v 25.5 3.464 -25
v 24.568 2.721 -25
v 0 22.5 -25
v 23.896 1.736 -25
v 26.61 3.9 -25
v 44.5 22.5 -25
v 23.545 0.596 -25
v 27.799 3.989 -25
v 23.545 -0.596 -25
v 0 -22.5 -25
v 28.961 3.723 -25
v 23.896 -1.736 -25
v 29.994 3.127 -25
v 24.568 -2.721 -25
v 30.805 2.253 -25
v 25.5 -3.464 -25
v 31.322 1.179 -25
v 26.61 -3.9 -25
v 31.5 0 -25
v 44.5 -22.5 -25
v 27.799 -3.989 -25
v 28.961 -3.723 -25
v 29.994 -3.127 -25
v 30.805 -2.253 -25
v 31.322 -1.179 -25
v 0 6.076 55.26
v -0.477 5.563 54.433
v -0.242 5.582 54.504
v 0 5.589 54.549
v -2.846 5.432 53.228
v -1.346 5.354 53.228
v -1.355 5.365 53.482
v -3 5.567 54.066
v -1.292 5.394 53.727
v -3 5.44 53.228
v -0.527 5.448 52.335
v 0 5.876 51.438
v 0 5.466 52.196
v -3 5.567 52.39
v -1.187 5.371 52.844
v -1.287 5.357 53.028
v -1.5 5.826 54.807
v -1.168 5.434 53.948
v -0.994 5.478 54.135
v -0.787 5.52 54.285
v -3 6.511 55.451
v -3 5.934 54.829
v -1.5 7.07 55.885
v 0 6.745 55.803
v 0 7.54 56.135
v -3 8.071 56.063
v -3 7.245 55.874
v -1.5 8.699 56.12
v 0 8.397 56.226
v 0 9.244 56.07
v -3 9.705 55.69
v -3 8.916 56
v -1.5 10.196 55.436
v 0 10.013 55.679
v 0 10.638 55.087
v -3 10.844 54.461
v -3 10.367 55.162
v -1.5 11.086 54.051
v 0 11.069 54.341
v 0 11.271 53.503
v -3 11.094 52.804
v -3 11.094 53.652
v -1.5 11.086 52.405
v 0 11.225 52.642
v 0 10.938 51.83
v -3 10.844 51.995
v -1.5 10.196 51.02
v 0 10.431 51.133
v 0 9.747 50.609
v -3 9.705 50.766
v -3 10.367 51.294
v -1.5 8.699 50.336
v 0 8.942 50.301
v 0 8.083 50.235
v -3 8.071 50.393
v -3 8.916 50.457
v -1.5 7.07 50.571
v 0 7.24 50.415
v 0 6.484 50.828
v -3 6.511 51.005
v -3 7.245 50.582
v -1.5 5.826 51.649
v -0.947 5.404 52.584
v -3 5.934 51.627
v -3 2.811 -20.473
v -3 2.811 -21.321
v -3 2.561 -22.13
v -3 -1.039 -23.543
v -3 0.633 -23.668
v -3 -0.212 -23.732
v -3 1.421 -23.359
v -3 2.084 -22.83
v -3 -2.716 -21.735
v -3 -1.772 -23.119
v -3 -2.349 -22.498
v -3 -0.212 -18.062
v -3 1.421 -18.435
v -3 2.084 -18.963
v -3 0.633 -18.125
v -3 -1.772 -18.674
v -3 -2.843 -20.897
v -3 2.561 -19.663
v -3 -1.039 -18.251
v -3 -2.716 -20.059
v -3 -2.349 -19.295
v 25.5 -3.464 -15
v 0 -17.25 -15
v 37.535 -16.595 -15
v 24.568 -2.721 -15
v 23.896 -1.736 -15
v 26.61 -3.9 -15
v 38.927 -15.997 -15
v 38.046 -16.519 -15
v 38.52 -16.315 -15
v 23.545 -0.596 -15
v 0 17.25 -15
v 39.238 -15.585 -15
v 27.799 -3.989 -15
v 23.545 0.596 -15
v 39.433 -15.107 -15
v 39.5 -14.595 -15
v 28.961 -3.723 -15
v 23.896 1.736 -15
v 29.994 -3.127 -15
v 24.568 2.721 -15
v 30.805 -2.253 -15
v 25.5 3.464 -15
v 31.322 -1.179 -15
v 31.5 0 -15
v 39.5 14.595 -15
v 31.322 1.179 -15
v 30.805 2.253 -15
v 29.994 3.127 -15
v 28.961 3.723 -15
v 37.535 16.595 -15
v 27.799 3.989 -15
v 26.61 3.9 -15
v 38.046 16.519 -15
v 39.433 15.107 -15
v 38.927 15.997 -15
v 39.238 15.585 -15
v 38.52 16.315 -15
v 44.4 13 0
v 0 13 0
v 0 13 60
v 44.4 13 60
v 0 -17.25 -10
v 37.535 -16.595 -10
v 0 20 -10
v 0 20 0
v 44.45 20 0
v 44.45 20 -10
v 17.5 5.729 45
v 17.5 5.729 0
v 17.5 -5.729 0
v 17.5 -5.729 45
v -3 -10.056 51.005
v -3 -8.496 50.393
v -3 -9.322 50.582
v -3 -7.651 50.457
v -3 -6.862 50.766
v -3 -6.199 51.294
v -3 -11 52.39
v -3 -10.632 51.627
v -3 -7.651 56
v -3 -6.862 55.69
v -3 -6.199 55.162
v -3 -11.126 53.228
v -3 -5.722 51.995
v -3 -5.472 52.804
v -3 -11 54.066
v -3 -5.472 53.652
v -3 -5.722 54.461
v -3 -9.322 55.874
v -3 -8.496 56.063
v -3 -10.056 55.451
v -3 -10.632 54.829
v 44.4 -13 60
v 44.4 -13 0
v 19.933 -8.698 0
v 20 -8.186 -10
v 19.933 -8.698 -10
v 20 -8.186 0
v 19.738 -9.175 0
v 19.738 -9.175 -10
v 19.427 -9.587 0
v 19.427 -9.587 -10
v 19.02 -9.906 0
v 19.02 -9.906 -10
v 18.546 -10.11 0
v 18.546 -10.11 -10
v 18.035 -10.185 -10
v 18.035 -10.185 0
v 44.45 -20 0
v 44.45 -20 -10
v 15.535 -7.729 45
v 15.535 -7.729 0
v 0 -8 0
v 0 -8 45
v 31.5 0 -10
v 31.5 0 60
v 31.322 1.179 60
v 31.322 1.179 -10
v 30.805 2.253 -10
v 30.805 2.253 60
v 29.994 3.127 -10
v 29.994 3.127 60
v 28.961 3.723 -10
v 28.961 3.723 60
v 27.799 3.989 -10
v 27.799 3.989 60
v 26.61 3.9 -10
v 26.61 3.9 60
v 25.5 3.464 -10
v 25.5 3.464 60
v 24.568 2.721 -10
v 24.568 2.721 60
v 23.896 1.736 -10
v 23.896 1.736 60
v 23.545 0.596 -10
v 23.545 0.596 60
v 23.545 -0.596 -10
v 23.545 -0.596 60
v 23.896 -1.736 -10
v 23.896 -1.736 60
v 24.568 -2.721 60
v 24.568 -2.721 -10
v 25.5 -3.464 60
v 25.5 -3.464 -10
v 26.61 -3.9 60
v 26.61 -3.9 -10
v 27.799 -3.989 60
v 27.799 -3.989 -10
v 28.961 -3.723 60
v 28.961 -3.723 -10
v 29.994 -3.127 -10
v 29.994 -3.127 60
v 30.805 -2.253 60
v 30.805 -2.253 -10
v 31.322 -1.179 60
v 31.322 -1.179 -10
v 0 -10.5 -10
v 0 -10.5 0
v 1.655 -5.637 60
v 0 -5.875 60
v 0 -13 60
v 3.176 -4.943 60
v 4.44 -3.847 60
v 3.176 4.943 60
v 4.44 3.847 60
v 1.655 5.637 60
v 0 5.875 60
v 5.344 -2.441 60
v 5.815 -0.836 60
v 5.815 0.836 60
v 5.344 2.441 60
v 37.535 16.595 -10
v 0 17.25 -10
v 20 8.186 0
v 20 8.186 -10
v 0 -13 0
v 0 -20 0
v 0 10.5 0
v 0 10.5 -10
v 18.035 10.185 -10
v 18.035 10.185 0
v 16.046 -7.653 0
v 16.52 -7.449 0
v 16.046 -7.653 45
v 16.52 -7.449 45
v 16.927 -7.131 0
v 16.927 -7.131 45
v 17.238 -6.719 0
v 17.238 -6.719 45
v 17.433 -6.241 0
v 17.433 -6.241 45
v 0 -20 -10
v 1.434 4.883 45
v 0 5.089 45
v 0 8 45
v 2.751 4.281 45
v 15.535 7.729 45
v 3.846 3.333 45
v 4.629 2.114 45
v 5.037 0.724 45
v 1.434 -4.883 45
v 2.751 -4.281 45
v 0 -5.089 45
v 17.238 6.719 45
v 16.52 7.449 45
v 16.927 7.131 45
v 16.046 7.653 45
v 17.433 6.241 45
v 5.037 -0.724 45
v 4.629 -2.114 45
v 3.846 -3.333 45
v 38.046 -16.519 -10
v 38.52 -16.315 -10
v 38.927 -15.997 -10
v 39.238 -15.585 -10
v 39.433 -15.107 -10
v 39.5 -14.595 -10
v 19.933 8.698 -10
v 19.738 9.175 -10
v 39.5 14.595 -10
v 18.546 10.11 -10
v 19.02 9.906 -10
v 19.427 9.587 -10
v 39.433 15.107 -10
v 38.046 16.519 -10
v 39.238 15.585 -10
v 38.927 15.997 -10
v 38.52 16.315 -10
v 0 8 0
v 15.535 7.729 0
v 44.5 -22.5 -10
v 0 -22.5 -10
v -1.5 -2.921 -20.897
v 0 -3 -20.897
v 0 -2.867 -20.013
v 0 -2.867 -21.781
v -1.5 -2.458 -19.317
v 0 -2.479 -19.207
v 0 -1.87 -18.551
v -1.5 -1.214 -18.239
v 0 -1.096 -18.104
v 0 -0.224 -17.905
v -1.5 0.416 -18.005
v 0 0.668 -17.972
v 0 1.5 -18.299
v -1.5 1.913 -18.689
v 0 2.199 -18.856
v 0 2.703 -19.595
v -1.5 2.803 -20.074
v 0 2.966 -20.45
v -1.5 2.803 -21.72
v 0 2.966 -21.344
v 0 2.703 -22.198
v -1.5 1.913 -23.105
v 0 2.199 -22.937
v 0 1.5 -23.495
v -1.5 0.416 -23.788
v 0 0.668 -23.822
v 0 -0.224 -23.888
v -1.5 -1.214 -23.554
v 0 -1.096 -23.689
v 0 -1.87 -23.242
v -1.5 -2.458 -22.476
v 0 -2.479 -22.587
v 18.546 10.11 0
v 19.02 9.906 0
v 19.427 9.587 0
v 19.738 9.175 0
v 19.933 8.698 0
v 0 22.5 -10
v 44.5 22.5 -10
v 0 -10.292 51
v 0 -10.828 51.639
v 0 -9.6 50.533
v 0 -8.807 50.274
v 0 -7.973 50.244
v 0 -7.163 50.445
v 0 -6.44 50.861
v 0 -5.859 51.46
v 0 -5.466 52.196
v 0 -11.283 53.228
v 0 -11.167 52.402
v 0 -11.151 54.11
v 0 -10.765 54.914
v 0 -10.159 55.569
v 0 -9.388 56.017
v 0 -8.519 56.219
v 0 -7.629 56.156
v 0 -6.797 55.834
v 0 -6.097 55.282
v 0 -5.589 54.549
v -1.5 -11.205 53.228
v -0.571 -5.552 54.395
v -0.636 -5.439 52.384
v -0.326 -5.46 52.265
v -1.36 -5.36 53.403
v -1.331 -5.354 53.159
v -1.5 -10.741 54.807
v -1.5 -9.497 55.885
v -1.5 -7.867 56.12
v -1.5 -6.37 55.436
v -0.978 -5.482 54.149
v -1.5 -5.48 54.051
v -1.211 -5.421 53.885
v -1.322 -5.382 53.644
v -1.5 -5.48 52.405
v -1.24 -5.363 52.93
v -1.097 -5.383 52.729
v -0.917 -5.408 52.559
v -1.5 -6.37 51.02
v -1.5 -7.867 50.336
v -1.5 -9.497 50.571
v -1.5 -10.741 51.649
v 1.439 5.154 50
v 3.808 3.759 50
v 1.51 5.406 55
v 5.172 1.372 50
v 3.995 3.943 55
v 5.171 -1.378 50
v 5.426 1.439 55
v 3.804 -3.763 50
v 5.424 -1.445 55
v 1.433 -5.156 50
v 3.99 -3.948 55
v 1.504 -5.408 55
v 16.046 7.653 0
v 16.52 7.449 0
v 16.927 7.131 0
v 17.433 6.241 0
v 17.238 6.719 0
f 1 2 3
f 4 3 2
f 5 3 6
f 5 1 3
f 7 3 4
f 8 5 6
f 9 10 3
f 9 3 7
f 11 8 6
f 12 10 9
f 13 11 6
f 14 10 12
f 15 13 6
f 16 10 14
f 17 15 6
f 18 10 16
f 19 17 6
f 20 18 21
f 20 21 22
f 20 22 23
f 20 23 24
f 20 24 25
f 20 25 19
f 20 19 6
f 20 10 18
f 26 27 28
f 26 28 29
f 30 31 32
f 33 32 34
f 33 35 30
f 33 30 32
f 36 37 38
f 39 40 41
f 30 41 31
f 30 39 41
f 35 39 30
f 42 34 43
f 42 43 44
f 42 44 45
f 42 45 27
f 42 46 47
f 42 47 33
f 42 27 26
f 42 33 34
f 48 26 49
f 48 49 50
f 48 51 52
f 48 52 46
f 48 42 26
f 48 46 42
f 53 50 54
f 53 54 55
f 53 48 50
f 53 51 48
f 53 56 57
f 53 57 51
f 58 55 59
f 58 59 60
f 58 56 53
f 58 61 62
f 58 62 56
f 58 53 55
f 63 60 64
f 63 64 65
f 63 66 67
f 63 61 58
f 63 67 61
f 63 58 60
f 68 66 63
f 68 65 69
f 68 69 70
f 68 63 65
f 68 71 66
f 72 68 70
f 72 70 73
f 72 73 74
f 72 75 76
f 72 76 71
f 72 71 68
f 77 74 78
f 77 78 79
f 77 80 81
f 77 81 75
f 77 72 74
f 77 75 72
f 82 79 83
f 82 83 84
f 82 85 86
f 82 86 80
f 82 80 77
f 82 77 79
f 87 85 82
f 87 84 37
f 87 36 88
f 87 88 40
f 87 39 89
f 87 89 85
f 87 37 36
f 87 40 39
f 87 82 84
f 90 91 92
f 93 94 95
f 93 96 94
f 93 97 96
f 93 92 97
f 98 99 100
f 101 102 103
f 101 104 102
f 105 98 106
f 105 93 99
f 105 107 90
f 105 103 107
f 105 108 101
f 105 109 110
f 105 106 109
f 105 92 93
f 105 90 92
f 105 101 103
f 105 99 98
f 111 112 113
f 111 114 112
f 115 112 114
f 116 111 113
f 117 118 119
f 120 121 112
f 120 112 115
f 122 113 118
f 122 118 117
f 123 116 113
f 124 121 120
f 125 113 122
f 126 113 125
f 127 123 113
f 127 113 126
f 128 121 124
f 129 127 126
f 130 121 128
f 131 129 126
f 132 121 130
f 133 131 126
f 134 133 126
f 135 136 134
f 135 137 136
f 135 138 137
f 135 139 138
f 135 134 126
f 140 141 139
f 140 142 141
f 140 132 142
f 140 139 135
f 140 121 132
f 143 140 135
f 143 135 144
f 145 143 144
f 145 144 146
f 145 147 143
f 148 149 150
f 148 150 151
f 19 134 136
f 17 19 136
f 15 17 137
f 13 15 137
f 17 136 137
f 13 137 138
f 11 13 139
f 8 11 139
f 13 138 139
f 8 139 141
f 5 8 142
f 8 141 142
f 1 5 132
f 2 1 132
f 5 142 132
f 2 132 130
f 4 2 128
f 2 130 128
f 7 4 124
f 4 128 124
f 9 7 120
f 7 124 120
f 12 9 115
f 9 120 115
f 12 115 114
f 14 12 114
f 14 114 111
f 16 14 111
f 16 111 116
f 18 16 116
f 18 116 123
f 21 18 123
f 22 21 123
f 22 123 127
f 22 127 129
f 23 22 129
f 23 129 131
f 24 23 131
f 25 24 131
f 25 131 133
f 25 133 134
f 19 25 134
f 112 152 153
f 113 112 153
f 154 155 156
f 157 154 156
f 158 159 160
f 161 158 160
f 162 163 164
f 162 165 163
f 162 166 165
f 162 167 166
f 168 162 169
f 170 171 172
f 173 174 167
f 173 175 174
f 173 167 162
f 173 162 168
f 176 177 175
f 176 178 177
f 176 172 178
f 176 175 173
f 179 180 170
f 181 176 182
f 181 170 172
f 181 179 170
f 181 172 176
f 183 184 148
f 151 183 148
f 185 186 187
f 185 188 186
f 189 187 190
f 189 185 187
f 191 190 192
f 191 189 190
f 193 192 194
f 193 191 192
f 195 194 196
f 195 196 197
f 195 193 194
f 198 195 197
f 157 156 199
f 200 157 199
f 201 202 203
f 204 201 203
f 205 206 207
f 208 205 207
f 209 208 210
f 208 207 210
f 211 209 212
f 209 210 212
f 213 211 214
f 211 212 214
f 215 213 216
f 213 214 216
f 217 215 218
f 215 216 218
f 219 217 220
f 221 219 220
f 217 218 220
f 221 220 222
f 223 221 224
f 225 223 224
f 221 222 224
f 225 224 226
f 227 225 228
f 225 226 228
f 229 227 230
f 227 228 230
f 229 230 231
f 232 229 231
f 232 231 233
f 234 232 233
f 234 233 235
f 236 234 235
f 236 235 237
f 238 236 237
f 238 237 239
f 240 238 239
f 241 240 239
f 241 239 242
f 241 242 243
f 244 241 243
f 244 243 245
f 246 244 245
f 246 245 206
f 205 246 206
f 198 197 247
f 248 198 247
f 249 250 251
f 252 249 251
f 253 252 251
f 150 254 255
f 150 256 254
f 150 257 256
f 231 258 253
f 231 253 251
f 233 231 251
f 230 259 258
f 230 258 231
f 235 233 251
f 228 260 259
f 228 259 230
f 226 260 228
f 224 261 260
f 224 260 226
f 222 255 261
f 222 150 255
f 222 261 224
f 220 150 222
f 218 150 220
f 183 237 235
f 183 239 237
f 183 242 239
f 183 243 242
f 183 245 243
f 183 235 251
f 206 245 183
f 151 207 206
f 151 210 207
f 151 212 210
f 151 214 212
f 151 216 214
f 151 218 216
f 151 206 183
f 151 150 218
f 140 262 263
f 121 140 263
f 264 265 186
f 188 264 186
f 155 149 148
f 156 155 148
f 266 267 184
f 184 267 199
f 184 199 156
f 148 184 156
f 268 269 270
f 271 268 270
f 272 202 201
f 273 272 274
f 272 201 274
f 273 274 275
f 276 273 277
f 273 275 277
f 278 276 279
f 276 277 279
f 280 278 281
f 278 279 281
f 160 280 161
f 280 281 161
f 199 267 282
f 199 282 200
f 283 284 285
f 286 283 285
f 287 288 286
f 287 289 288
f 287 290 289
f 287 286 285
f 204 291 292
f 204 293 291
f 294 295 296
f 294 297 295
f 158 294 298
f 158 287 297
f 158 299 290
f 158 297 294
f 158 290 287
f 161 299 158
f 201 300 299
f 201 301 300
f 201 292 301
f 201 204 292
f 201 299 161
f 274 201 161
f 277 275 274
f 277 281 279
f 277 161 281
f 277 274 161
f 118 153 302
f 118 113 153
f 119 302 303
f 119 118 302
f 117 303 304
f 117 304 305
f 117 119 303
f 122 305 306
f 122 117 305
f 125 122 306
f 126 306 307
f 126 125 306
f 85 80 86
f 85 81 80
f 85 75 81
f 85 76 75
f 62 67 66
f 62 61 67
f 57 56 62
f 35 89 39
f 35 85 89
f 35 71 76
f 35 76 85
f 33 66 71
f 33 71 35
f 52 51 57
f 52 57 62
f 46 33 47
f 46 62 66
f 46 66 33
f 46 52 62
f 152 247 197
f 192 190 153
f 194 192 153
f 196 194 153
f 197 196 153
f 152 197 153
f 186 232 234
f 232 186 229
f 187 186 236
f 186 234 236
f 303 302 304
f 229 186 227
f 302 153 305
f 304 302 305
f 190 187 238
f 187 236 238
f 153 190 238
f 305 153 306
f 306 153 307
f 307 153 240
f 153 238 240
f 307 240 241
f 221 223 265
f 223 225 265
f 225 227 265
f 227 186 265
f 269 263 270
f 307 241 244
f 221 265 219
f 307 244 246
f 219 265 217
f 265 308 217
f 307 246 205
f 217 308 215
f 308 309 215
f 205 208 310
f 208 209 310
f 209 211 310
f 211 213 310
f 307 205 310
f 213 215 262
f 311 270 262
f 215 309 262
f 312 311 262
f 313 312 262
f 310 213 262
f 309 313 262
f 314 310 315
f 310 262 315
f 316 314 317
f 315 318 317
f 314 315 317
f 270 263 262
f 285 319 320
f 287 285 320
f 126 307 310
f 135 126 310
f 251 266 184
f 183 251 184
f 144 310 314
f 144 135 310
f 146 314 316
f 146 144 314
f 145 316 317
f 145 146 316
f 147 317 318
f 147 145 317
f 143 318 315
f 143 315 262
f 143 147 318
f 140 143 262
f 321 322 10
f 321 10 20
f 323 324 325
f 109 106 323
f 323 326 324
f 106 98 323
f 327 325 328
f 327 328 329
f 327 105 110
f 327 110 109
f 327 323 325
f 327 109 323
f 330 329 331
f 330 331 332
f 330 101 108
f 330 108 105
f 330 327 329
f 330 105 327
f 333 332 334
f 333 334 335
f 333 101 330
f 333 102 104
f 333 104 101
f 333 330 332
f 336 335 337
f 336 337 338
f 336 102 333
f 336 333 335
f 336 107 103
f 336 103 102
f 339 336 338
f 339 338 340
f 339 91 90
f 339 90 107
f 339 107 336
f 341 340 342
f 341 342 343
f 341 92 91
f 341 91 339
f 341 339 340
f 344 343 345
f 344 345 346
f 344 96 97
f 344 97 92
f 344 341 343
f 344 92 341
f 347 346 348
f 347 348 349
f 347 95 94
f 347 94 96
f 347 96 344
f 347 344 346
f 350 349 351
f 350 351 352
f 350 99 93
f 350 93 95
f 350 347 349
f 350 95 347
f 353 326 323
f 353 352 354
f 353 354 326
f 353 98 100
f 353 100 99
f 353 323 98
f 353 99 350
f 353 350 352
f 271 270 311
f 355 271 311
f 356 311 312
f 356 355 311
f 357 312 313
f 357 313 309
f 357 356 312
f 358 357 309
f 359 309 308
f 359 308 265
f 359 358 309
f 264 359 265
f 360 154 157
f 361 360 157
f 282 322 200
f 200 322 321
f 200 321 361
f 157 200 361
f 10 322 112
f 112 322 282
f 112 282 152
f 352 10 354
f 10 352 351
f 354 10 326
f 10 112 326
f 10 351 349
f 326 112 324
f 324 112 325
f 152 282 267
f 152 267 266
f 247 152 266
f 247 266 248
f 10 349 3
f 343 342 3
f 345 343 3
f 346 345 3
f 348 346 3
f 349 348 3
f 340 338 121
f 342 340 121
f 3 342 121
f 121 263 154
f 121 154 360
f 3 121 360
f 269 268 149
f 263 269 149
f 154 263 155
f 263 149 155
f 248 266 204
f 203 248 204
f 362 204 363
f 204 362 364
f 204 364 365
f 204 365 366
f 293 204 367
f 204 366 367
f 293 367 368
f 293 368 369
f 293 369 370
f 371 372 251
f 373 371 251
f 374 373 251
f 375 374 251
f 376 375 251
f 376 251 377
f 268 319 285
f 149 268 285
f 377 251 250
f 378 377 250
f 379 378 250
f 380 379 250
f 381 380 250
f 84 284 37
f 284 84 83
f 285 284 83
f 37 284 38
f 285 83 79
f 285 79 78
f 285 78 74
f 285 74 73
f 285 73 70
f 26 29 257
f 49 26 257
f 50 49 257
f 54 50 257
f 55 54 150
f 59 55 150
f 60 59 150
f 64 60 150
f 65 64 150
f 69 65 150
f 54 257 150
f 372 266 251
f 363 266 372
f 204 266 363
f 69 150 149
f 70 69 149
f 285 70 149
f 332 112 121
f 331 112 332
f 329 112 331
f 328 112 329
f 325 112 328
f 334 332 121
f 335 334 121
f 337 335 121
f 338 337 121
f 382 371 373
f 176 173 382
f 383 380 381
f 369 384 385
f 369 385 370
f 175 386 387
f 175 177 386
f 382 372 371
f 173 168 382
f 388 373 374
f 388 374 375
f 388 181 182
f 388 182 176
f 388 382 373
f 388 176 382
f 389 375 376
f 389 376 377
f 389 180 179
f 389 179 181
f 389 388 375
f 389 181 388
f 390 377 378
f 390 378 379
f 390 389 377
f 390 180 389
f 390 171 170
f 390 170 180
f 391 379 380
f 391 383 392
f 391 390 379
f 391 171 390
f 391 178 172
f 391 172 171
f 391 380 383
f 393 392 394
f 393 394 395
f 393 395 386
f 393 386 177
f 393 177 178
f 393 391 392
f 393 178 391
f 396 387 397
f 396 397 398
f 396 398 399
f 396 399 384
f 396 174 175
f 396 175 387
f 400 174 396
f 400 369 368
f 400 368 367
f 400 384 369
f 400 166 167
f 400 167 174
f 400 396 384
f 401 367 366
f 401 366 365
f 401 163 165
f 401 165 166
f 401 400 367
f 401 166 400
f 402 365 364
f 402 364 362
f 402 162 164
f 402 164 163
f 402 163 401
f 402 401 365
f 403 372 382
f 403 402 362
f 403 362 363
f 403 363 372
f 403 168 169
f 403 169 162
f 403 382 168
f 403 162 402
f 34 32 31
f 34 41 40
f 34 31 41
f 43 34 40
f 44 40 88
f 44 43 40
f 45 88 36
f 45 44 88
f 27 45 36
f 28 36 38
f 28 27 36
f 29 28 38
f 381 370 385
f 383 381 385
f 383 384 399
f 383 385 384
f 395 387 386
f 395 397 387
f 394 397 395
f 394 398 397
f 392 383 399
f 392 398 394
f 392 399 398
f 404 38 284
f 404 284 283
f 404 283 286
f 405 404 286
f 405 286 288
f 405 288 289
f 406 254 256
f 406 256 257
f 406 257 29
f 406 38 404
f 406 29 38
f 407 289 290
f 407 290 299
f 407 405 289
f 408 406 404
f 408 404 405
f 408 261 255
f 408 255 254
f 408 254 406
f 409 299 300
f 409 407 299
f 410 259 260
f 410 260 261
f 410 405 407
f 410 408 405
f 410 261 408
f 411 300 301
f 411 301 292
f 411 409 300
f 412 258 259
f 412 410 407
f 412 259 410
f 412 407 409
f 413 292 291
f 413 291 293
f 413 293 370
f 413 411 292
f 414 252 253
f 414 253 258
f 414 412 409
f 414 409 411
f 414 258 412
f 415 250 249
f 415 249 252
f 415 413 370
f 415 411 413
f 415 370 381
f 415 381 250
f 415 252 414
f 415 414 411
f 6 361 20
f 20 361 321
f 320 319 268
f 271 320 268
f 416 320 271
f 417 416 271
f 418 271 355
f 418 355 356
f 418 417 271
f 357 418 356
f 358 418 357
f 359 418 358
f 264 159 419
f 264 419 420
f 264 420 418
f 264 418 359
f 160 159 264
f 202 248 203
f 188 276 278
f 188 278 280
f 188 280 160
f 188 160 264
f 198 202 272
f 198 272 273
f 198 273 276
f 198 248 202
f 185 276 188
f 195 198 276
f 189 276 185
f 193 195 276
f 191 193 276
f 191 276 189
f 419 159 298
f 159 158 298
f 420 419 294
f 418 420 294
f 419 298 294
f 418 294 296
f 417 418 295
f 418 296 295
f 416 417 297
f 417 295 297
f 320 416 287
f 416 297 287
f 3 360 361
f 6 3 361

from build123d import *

# Parameters (mm, degrees)
F0_W      = 88.8
F0_H      = 26
F1_DEPTH  = 60
F3_DEPTH  = 45
F4_R      = 2
F5_W      = 88.9
F5_H      = 40
F6_DEPTH  = 10
F8_DEPTH  = 10
F9_R      = 2
F10_W     = 89
F10_H     = 45
F11_DEPTH = 15
F13_DEPTH = 5
F14_R     = 2
F15_R     = 4.6723110677
F15_R_2   = 4
F16_DEPTH = 85.001
F17_W     = 79.5239582658
F17_H     = 118.802215904
F18_DEPTH = 80
F19_R     = 3
F20_DEPTH = 3
F20_TAPER = 3
F21_DEPTH = 3
F21_TAPER = 3
F22_R     = 5.0890490665
F23_DEPTH = 25
F23_TAPER = -3


with BuildPart() as f1:
    # F0 (on Top) → F1 (new body)
    with BuildSketch(Plane.XY):
        Rectangle(F0_W, F0_H)
    extrude(amount=F1_DEPTH)

    # F2 (on face) → F3 (cut)
    with BuildSketch(Plane(origin=(0, 0, 0), x_dir=(1, 0, 0), z_dir=(0, 0, -1))):
        Polygon((-17.5, -7.6945363638), (0, -8), (17.5, -7.6945363638), (17.5, 7.6945363638), (0, 8), (-17.5, 7.6945363638), align=None)
    extrude(amount=-F3_DEPTH, mode=Mode.SUBTRACT)

    # F4
    f4_edges = [f1.edges().sort_by_distance(p)[0] for p in [
        (-17.5, 7.694536, 22.5),
        (-17.5, -7.694536, 22.5),
        (17.5, -7.694536, 22.5),
        (17.5, 7.694536, 22.5),
    ]]
    fillet(f4_edges, radius=F4_R)

    # F5 (on face) → F6 (join)
    with BuildSketch(Plane(origin=(0, 0, 0), x_dir=(1, 0, 0), z_dir=(0, 0, -1))):
        Rectangle(F5_W, F5_H)
    extrude(amount=F6_DEPTH)

    # F7 (on face) → F8 (cut)
    with BuildSketch(Plane(origin=(0, 0, -10), x_dir=(1, 0, 0), z_dir=(0, 0, -1))):
        Polygon((-20, -10.1508987014), (0, -10.5), (20, -10.1508987014), (20, 10.1508987014), (0, 10.5), (-20, 10.1508987014), align=None)
    extrude(amount=-F8_DEPTH, mode=Mode.SUBTRACT)

    # F9
    f9_edges = [f1.edges().sort_by_distance(p)[0] for p in [
        (-20, 10.150899, -5),
        (-20, -10.150899, -5),
        (20, 10.150899, -5),
        (20, -10.150899, -5),
    ]]
    fillet(f9_edges, radius=F9_R)

    # F10 (on face) → F11 (join)
    with BuildSketch(Plane(origin=(0, 0, -10), x_dir=(1, 0, 0), z_dir=(0, 0, -1))):
        Rectangle(F10_W, F10_H)
    extrude(amount=F11_DEPTH)

    # F12 (on face) → F13 (cut)
    with BuildSketch(Plane.XY.offset(-10)):
        Polygon((-39.5, -16.5605249353), (0, -17.25), (39.5, -16.5605249353), (39.5, 16.5605249353), (0, 17.25), (-39.5, 16.5605249353), align=None)
    extrude(amount=-F13_DEPTH, mode=Mode.SUBTRACT)

    # F14
    f14_edges = [f1.edges().sort_by_distance(p)[0] for p in [
        (-39.5, 16.560525, -12.5),
        (-39.5, -16.560525, -12.5),
        (39.5, -16.560525, -12.5),
        (39.5, 16.560525, -12.5),
    ]]
    fillet(f14_edges, radius=F14_R)

    # F15 (on face) → F16 (cut, through all)
    with BuildSketch(Plane.XY.offset(60)):
        with Locations((-27.5, 0)):
            Circle(F15_R)
        with Locations((27.5, 0)):
            Circle(F15_R_2)
    extrude(amount=-F16_DEPTH, mode=Mode.SUBTRACT)

    # F17 (on Right) → F18 (cut)
    with BuildSketch(Plane.YZ):
        with Locations((3.9665214717, 9.8679382354)):
            Rectangle(F17_W, F17_H)
    extrude(amount=-F18_DEPTH, mode=Mode.SUBTRACT)

    # F19 (on face) → F20 (join)
    with BuildSketch(Plane(origin=(0, 0, 0), x_dir=(0, -1, 0), z_dir=(-1, 0, 0))):
        with Locations((8.2831978798, 53.2280467451)):
            Circle(F19_R)
        with Locations((0, -20.896807313)):
            Circle(F19_R)
        with Locations((-8.2831978798, 53.2280467451)):
            Circle(F19_R)
    extrude(amount=F20_DEPTH, taper=F20_TAPER)

    # F19 (on face) → F21 (join)
    with BuildSketch(Plane(origin=(0, 0, 0), x_dir=(0, -1, 0), z_dir=(-1, 0, 0))):
        with Locations((8.2831978798, 53.2280467451)):
            Circle(F19_R)
        with Locations((0, -20.896807313)):
            Circle(F19_R)
        with Locations((-8.2831978798, 53.2280467451)):
            Circle(F19_R)
    extrude(amount=F21_DEPTH, taper=F21_TAPER)

    # F22 (on face) → F23 (cut)
    with BuildSketch(Plane(origin=(0, 0, 45), x_dir=(1, 0, 0), z_dir=(0, 0, -1))):
        Circle(F22_R)
    extrude(amount=-F23_DEPTH, taper=F23_TAPER, mode=Mode.SUBTRACT)


solid = f1.part
